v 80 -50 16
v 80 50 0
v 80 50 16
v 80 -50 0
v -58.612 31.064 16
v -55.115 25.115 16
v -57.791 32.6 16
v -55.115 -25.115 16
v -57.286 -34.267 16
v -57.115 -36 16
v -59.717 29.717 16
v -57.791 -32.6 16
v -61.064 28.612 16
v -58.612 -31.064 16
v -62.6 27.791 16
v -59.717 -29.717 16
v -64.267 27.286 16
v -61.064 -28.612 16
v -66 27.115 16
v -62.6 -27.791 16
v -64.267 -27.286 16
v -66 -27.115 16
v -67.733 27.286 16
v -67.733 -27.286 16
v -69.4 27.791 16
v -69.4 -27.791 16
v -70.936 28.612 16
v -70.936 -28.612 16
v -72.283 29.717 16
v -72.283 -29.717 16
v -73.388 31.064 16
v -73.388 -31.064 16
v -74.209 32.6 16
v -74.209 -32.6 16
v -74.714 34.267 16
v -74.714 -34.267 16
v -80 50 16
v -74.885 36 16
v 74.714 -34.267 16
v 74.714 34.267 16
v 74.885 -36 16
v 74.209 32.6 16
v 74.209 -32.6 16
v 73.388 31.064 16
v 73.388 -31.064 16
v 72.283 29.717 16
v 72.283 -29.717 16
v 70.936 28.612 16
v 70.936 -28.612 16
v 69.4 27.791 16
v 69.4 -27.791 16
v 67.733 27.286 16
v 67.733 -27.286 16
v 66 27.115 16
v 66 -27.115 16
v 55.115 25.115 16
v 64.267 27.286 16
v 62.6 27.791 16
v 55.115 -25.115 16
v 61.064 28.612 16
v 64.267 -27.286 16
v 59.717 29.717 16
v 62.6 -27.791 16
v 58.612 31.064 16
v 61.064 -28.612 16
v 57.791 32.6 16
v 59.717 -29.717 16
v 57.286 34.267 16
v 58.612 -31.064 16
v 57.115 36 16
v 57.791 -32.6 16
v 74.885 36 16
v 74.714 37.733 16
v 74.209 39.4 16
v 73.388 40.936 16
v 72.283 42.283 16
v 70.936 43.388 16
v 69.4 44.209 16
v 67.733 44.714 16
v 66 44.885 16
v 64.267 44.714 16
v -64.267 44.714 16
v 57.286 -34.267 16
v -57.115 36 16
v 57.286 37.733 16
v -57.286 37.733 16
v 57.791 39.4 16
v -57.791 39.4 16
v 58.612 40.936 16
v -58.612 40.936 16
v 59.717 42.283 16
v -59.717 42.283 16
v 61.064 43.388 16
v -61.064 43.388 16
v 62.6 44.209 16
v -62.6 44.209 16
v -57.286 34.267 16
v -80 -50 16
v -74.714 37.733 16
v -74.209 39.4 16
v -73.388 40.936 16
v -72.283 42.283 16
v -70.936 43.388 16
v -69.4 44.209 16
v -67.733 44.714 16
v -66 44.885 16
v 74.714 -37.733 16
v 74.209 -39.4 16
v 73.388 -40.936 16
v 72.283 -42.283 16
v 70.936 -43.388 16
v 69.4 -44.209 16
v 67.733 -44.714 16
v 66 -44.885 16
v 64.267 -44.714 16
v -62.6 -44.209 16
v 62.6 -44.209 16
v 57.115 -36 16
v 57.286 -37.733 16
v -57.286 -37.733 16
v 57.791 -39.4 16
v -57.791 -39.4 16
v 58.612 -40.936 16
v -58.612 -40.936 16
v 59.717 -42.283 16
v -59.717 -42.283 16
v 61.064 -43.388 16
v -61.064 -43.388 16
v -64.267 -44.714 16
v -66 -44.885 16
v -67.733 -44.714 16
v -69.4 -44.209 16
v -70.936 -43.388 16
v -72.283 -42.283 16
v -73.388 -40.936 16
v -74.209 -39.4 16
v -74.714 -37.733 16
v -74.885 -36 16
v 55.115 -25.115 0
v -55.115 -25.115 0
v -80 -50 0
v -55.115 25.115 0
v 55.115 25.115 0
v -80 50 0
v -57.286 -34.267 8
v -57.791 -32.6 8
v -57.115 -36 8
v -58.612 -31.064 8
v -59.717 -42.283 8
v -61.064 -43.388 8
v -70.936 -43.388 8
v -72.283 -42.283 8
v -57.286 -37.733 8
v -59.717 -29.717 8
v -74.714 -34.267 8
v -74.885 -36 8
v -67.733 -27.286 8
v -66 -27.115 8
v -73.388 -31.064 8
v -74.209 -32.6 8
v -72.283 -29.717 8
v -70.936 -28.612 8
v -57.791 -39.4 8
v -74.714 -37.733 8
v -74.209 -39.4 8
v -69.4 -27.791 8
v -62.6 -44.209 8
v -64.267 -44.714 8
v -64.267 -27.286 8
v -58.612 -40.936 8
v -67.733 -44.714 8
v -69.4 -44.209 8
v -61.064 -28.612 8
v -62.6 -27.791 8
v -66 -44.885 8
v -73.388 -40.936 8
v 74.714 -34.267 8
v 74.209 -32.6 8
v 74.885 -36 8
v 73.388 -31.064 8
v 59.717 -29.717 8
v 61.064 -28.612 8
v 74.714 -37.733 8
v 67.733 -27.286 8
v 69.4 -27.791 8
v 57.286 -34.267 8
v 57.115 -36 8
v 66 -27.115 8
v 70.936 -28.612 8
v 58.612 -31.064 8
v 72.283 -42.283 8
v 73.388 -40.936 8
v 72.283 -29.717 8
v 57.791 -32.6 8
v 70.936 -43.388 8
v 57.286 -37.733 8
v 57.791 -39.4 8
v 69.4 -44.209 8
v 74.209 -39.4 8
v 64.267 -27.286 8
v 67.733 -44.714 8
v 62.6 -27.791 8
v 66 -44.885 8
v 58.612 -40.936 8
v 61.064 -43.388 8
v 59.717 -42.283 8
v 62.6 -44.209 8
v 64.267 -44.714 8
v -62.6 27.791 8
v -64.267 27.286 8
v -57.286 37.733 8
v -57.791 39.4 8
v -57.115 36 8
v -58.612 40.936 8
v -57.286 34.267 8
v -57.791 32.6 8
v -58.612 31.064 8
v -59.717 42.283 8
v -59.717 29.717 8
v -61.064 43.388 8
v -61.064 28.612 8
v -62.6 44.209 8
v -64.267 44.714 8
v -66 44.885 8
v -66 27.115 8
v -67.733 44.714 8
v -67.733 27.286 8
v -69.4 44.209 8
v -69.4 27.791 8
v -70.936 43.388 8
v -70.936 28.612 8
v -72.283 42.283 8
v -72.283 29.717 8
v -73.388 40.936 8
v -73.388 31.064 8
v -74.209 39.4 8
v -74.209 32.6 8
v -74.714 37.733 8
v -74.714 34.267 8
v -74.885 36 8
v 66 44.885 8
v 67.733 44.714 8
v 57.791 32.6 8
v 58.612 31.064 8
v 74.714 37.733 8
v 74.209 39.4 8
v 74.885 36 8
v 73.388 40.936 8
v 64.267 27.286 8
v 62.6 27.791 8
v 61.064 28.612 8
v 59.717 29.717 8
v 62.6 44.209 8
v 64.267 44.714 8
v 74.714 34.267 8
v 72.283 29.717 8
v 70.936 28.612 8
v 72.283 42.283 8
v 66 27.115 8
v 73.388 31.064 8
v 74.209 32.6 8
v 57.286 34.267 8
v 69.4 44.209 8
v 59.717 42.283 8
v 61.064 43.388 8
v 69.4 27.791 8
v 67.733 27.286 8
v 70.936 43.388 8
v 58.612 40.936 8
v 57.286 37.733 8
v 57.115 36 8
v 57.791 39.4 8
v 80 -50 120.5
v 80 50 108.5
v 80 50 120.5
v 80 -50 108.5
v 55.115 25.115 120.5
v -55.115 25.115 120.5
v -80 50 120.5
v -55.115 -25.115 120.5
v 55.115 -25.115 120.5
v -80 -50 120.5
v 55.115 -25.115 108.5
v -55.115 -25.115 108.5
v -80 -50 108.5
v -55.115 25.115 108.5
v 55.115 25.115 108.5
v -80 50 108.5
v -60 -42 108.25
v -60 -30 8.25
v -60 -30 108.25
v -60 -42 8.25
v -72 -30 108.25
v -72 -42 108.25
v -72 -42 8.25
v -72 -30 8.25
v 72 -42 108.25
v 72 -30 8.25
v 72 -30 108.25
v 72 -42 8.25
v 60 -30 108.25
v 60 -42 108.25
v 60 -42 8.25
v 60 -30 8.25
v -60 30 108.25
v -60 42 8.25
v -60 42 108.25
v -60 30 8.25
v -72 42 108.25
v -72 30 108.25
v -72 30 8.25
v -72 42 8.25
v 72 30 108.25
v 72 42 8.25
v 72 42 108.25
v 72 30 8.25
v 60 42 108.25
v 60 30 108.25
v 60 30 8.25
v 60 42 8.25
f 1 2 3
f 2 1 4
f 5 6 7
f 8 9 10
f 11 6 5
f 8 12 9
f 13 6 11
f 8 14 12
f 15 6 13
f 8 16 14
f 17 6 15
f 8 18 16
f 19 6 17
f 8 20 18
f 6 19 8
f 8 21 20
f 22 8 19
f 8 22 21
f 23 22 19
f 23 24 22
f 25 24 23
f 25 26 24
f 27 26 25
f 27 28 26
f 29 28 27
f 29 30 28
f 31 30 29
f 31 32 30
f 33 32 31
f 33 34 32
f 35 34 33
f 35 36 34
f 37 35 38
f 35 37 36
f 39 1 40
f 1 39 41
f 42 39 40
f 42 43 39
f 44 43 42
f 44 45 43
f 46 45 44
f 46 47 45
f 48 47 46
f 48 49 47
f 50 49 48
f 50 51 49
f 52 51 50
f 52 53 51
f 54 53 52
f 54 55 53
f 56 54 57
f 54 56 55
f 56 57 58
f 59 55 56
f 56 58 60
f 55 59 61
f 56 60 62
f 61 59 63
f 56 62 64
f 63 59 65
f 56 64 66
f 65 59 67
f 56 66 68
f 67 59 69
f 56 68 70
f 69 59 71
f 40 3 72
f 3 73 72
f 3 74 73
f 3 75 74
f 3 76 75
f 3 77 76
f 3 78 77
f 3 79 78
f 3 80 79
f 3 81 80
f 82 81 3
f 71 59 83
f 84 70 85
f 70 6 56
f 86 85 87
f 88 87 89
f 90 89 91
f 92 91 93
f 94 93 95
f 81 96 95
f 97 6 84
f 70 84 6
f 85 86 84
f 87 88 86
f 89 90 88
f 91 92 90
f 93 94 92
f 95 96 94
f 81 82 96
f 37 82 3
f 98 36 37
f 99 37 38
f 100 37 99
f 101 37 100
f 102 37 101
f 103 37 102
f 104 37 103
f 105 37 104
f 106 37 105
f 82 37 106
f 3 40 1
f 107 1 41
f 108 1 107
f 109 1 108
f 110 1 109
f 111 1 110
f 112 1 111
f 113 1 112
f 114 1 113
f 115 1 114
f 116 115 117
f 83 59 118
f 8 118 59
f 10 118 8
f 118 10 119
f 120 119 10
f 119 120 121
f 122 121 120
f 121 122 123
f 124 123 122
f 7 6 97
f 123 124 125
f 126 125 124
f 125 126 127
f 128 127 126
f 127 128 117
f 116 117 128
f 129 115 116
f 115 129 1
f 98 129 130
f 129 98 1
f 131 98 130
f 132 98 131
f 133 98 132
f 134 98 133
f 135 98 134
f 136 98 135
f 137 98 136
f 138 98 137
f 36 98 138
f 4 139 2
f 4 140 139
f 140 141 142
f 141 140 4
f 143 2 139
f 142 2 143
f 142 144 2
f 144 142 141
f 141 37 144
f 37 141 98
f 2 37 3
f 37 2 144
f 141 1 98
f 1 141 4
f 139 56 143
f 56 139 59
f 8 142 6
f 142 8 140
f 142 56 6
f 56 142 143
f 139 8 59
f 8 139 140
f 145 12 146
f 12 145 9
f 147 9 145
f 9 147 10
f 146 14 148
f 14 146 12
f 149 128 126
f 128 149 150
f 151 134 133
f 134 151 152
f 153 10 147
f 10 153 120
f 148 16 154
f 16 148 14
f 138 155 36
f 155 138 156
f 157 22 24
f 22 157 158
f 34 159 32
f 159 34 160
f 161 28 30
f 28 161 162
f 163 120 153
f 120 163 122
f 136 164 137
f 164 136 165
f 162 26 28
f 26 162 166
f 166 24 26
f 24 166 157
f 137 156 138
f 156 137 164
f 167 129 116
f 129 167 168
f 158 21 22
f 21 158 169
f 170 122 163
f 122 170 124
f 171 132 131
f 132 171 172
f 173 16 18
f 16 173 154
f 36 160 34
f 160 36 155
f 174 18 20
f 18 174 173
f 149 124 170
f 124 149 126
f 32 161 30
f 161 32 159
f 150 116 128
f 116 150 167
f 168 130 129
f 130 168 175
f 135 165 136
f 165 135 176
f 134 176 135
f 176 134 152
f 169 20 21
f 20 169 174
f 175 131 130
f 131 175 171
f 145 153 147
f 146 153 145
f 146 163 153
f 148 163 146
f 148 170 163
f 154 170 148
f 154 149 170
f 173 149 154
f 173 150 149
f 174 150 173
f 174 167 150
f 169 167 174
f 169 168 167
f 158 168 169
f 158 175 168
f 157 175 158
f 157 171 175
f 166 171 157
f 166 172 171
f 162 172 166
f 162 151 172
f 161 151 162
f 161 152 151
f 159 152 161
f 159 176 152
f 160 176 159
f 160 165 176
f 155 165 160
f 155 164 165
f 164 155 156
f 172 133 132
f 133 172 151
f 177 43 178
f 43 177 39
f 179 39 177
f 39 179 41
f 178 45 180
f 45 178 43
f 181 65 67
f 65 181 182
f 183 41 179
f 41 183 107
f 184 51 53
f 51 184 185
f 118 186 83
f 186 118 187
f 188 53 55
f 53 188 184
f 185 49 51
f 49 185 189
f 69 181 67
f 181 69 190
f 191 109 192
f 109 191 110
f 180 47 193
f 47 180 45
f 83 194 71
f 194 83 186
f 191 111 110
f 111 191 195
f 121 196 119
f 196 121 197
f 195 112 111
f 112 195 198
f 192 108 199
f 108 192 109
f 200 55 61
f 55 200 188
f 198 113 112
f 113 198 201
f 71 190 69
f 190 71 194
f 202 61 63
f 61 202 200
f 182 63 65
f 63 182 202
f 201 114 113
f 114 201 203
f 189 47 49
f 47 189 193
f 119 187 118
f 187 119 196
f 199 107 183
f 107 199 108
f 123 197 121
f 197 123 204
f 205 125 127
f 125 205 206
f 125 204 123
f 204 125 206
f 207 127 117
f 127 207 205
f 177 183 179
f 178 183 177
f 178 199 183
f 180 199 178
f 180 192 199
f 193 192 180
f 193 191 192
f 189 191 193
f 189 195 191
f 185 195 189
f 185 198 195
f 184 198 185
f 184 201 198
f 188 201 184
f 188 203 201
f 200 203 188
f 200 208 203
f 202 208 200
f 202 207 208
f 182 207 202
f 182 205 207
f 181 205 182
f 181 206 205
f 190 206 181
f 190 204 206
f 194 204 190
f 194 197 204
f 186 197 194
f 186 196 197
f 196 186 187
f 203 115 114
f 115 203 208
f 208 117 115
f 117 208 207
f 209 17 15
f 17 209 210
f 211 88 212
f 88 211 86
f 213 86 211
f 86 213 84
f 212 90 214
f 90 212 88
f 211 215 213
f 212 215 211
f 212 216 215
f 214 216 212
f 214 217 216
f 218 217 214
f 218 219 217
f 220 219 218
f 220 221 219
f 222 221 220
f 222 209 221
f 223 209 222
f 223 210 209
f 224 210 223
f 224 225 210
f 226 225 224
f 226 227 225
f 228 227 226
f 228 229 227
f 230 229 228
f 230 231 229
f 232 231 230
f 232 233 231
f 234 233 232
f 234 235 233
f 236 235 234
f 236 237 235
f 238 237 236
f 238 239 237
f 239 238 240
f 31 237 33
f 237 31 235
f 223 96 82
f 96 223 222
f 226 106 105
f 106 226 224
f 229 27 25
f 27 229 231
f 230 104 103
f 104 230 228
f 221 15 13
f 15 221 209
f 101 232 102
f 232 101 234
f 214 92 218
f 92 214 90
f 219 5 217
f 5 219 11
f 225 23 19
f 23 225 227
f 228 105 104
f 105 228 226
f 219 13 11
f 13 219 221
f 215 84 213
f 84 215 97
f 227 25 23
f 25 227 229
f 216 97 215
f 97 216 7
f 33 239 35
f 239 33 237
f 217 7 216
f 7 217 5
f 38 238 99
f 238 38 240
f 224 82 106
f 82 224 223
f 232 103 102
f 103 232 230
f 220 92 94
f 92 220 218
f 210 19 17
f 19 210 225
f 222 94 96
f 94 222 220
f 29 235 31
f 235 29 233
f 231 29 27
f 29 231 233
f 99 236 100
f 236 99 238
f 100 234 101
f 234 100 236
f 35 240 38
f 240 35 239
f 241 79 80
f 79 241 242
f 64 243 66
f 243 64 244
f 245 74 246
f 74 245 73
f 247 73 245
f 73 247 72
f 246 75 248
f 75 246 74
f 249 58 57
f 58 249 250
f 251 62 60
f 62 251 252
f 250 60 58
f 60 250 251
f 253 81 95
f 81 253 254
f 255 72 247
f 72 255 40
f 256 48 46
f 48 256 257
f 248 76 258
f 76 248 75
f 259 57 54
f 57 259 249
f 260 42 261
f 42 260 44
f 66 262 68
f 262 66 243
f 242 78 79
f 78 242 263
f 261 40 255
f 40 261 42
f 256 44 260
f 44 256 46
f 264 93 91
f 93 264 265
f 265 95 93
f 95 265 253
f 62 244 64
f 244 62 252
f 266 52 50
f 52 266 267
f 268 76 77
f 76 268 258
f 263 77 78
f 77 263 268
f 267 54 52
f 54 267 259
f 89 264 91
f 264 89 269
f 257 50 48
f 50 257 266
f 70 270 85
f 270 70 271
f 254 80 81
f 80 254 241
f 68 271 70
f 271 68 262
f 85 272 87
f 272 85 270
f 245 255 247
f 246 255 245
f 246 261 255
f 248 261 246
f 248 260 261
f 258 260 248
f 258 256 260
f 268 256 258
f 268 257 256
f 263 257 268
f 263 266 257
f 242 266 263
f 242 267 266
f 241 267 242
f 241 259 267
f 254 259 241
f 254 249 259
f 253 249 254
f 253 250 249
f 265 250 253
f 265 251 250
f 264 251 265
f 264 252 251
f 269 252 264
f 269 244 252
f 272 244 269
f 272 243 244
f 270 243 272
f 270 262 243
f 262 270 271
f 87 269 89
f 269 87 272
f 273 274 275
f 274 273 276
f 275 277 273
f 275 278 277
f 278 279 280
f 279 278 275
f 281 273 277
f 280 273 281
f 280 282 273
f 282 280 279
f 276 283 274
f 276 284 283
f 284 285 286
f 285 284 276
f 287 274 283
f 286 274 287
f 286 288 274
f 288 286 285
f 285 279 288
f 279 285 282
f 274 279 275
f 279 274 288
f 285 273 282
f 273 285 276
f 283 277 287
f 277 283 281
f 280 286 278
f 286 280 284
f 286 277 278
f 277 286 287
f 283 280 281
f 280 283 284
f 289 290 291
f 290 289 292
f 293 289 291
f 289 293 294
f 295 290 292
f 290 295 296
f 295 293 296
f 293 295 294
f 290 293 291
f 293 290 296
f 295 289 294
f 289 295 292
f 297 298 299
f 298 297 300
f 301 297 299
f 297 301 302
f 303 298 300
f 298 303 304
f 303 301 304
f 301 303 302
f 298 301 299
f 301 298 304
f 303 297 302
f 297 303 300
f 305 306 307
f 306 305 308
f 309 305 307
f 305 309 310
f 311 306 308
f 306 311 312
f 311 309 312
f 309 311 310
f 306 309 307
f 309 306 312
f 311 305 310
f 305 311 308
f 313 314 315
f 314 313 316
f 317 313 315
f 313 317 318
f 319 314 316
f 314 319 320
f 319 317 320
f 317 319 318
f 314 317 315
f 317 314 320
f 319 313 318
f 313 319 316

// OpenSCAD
$fn = 32;

// ------------------------------------------------------------------------
// Frame cube: base 160 x 100 mm, posts 100 mm tall
// Every part is its own module, assembly() places every instance.
// ------------------------------------------------------------------------

// --- part 1 ---
module base_frame() {
  difference() {
    translate([-80, -50, 0]) cube([160, 100, 16]);
    translate([-55.115, -25.115, -1]) cube([110.23, 50.23, 18]);
    translate([-66, -36, 8]) cylinder(h = 9, d = 17.77);
    translate([66, -36, 8]) cylinder(h = 9, d = 17.77);
    translate([-66, 36, 8]) cylinder(h = 9, d = 17.77);
    translate([66, 36, 8]) cylinder(h = 9, d = 17.77);
  }
}

// --- part 2 ---
module corner_post() {
  translate([-6, -6, 0]) cube([12, 12, 100]);
}

// --- part 3 ---
module top_frame() {
  difference() {
    translate([-80, -50, 0]) cube([160, 100, 12]);
    translate([-55.115, -25.115, -1]) cube([110.23, 50.23, 14]);
  }
}

// --- assembly ---
module assembly() {
  color([0.80, 0.24, 0.20]) translate([0, 0, 0]) rotate([0, 0, 0]) base_frame();
  color([0.20, 0.45, 0.75]) translate([-66, -36, 8.25]) rotate([0, 0, 0]) corner_post();
  color([0.25, 0.62, 0.32]) translate([66, -36, 8.25]) rotate([0, 0, 0]) corner_post();
  color([0.92, 0.70, 0.18]) translate([-66, 36, 8.25]) rotate([0, 0, 0]) corner_post();
  color([0.58, 0.35, 0.70]) translate([66, 36, 8.25]) rotate([0, 0, 0]) corner_post();
  color([0.16, 0.66, 0.66]) translate([0, 0, 108.5]) rotate([0, 0, 0]) top_frame();
}

assembly();
